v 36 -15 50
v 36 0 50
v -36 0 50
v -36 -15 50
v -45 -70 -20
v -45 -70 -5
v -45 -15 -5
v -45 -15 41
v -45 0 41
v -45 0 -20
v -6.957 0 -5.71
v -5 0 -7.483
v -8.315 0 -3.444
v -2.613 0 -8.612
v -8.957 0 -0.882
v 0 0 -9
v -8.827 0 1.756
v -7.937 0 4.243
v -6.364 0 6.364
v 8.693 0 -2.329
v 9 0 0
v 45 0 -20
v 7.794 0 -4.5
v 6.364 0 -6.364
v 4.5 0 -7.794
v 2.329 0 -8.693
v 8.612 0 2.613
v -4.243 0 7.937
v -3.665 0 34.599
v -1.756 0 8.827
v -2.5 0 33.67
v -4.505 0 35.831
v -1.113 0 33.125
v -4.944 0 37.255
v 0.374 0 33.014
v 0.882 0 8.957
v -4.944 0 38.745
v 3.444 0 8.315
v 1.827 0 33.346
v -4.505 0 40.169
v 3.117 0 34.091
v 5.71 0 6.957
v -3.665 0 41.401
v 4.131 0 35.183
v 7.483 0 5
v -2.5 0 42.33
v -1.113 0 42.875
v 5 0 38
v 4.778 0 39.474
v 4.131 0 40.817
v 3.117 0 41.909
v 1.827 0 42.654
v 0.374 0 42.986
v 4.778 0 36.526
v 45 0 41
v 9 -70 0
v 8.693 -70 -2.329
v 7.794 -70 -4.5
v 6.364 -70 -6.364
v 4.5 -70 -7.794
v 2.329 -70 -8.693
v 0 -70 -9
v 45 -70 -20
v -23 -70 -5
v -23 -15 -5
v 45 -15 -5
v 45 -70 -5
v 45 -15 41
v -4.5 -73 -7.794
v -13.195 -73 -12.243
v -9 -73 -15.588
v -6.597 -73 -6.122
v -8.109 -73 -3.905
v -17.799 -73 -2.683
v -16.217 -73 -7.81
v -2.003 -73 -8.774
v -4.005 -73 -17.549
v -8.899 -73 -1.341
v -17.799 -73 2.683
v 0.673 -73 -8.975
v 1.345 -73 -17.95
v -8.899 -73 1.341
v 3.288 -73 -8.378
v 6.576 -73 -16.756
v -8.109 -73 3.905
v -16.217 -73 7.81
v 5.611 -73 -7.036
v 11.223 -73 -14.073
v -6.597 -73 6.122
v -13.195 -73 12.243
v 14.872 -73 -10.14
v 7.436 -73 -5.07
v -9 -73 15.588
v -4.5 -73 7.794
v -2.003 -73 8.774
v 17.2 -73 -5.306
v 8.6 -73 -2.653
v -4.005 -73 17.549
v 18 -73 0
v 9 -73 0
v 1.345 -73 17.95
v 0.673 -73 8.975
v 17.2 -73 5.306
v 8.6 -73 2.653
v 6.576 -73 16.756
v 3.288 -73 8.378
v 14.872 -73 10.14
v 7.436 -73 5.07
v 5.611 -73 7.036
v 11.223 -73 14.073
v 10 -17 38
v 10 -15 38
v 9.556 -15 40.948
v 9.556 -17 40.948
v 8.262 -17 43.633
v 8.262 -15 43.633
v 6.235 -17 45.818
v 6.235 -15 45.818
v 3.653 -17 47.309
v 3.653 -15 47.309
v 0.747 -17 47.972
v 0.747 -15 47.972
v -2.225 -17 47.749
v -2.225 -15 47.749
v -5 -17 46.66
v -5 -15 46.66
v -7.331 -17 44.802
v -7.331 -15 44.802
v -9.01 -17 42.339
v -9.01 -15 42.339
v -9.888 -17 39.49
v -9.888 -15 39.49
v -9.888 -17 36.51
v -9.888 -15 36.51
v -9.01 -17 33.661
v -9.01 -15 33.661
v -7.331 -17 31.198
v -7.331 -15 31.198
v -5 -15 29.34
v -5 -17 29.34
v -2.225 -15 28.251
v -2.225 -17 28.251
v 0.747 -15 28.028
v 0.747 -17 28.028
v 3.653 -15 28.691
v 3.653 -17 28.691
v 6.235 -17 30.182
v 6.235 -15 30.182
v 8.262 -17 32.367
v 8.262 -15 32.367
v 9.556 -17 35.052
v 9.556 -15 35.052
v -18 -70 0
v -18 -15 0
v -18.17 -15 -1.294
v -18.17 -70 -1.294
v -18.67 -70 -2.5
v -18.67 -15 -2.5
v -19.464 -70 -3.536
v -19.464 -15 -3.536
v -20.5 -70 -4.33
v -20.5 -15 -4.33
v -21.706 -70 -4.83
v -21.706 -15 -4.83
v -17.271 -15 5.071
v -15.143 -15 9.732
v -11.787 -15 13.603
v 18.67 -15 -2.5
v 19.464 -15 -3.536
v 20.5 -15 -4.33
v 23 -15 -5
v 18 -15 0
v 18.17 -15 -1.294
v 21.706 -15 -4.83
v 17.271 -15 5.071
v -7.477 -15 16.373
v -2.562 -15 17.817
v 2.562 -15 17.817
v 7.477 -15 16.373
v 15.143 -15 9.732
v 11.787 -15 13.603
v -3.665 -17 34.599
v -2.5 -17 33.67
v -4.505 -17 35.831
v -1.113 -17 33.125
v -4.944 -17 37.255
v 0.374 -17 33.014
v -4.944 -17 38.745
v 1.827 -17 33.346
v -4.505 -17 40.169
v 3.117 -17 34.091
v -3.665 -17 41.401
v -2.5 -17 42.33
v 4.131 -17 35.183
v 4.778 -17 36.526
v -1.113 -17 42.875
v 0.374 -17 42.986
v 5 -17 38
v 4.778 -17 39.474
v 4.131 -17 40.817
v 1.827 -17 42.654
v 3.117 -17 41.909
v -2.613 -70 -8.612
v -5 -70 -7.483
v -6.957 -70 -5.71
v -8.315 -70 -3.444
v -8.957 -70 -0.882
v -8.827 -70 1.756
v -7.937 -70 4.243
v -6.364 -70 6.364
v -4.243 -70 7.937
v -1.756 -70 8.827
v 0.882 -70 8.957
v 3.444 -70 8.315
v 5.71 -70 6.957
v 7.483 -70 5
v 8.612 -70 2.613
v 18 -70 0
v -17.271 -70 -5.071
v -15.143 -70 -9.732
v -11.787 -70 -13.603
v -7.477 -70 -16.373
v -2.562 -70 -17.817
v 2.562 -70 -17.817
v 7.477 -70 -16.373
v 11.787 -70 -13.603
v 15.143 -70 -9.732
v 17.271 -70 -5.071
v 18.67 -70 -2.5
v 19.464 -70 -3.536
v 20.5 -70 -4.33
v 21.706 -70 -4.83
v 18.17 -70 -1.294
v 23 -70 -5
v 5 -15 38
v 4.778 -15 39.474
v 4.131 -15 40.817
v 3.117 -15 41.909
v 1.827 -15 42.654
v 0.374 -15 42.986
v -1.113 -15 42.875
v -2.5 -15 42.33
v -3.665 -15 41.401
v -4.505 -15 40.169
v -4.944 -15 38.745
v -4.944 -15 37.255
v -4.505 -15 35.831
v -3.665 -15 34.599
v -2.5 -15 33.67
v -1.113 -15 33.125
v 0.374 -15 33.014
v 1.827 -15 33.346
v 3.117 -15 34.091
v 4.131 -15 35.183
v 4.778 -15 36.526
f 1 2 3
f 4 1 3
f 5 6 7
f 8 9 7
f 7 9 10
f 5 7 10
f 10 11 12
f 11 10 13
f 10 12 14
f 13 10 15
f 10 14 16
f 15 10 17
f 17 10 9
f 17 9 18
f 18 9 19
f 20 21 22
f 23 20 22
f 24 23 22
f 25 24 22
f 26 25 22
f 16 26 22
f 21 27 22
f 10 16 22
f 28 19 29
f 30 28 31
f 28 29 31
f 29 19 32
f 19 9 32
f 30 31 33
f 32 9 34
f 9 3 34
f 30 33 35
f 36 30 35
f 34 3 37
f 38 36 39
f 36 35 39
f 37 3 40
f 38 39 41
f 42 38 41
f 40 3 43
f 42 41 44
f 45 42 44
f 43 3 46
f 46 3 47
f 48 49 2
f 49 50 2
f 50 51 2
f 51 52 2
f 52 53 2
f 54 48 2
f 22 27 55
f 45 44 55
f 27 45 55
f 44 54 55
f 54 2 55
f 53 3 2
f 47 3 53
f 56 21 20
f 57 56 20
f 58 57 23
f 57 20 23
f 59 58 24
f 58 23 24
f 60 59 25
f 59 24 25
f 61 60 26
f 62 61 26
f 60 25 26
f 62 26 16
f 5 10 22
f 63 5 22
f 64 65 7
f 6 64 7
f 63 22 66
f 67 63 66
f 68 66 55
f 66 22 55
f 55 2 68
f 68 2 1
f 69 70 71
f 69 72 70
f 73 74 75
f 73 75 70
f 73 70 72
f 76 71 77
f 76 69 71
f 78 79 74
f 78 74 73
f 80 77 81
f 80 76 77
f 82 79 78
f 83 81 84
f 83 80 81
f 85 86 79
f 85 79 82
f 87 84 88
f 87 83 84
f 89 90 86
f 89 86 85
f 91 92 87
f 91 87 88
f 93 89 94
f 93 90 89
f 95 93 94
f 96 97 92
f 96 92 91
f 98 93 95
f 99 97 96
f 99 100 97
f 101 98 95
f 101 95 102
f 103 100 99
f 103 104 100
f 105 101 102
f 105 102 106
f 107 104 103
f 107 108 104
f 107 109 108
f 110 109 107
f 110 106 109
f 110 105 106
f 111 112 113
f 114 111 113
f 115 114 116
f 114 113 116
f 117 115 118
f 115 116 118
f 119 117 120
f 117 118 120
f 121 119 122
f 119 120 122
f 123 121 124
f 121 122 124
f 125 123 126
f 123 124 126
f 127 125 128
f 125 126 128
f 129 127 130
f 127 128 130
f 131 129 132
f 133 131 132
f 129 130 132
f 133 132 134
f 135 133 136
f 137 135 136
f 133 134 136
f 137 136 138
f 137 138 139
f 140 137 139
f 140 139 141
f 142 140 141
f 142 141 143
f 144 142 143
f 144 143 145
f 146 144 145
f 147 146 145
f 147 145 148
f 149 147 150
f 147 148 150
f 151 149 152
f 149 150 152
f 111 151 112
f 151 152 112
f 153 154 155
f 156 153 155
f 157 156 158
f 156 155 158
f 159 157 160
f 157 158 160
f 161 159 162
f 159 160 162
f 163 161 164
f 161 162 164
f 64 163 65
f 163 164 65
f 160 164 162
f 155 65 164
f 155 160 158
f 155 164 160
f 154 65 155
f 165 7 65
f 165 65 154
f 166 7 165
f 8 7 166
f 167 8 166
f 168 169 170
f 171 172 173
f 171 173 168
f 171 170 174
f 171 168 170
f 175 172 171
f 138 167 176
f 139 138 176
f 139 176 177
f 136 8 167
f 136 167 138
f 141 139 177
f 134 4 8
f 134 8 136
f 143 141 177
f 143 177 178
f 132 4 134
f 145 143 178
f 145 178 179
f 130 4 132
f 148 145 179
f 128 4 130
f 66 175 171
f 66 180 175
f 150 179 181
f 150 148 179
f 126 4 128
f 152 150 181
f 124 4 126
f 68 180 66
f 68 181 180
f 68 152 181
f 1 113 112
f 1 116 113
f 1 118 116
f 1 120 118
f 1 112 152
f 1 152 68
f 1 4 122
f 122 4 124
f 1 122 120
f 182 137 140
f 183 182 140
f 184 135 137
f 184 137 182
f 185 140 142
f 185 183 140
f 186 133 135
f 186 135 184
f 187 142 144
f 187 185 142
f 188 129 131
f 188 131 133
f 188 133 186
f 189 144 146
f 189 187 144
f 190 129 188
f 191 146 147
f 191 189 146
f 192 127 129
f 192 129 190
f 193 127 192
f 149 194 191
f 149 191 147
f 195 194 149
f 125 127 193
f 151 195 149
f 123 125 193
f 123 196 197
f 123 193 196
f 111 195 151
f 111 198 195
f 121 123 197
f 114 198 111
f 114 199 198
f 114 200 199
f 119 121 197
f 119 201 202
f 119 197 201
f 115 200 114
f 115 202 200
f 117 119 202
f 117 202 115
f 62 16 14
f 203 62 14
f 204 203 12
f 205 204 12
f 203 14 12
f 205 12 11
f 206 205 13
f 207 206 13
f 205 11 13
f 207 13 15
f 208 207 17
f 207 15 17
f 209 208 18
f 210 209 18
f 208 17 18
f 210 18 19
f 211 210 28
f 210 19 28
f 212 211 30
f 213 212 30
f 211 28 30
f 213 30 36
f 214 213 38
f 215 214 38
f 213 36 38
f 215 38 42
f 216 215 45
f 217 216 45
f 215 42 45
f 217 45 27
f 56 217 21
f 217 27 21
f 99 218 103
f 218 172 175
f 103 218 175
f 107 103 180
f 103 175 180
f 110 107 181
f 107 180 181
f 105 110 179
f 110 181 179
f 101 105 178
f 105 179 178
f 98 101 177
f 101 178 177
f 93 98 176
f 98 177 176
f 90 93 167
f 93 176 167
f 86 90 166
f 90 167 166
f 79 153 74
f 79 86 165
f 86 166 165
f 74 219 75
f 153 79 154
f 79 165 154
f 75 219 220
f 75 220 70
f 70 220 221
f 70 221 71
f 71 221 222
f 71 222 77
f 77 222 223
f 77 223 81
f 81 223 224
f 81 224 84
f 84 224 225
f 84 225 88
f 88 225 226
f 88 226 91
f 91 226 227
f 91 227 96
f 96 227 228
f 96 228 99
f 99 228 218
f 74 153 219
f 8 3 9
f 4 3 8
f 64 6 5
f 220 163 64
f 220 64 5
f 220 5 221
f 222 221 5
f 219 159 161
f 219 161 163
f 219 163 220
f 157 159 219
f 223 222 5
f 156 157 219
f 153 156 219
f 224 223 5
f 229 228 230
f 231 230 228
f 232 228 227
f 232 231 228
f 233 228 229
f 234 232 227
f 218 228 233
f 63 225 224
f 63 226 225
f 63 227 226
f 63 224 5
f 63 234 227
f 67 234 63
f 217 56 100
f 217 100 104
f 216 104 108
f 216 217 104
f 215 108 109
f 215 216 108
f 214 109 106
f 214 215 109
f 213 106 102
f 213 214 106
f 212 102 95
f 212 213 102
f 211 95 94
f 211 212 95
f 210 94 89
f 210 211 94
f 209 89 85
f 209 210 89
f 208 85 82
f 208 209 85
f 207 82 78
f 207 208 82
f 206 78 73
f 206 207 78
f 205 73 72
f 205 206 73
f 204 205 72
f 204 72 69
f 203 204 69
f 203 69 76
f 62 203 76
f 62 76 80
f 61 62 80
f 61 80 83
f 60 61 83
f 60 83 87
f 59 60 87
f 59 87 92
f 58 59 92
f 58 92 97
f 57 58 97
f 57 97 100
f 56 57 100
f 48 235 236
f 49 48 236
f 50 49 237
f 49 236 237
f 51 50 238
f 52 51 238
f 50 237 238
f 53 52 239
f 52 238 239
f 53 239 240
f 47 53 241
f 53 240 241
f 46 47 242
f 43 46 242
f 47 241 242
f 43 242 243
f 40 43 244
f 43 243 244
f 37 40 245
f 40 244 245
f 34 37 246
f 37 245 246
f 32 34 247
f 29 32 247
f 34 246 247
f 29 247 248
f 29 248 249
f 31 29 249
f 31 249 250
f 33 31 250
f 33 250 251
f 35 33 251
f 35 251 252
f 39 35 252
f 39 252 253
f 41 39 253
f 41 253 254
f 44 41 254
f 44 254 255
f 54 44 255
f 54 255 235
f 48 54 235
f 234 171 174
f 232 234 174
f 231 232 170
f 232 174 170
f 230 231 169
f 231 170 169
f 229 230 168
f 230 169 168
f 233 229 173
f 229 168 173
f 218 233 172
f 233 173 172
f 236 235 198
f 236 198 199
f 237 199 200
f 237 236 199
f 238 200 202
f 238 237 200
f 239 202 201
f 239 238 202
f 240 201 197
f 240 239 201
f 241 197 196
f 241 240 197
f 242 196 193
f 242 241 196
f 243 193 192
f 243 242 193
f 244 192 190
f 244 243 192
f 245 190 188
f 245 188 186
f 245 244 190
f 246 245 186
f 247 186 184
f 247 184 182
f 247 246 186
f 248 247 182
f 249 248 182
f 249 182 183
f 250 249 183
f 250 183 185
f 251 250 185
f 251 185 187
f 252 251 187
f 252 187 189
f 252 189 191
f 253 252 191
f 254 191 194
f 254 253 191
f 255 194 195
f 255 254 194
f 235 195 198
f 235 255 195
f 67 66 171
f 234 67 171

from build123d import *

# Parameters (mm, degrees)
F1_DEPTH    = 70
F2_T1_DEPTH = 70
F3_T1_DEPTH = 70
F5_DEPTH    = 15
F6_SIZE     = 9
F7_R        = 9
F8_DEPTH    = 3
F9_R        = 5
F10_DEPTH   = 25
F11_R       = 10
F11_R_2     = 5
F12_DEPTH   = 2


# Not quite as in the source:
# - a fillet or chamfer that OpenCascade refuses, or shapes differently, is made with other operations: its cross-section is extruded or revolved along the edge and cut away or added


with BuildPart() as f1:
    # F0 (on Front) → F1 (new body)
    with BuildSketch(Plane.XZ):
        with BuildLine():
            Line((45, -5), (17.2916164658, -5))
            ThreePointArc((17.2916164658, -5), (10.8166538264, -14.3874945699), (0, -18))
            Line((0, -18), (0, -20))
            Line((0, -20), (45, -20))
            Line((45, -20), (45, -5))
        make_face()
        with BuildLine():
            ThreePointArc((17.2916164658, -5), (17.8220242451, -2.5249657043), (18, 0))
            ThreePointArc((18, 0), (-2.5249657043, 17.8220242451), (-17.2916164658, -5))
            ThreePointArc((-17.2916164658, -5), (-10.8166538264, -14.3874945699), (0, -18))
            ThreePointArc((0, -18), (10.8166538264, -14.3874945699), (17.2916164658, -5))
        make_face()
        with BuildLine():
            ThreePointArc((9, 0), (6.3639610307, -6.3639610307), (0, -9))
            ThreePointArc((0, -9), (-6.3639610307, 6.3639610307), (9, 0))
        make_face(mode=Mode.SUBTRACT)
        with BuildLine():
            ThreePointArc((0, -18), (-10.8166538264, -14.3874945699), (-17.2916164658, -5))
            Line((-17.2916164658, -5), (-45, -5))
            Line((-45, -5), (-45, -20))
            Line((-45, -20), (0, -20))
            Line((0, -20), (0, -18))
        make_face()
    extrude(amount=F1_DEPTH)

    # F2: fillet of radius 5 on 1 edges, made by hand

    # F2_s2 → F2_t1 (join)
    with BuildSketch(Plane.XZ):
        with BuildLine():
            ThreePointArc((-18, 0), (-19.4644660941, -3.5355339059), (-23, -5))
            Line((-23, -5), (-17.2916164658, -5))
            ThreePointArc((-17.2916164658, -5), (-17.8220242451, -2.5249657043), (-18, 0))
        make_face()
    extrude(amount=F2_T1_DEPTH)

    # F3: fillet of radius 5 on 1 edges, made by hand

    # F3_s2 → F3_t1 (join)
    with BuildSketch(Plane.XZ):
        with BuildLine():
            ThreePointArc((23, -5), (19.4644660941, -3.5355339059), (18, 0))
            ThreePointArc((18, 0), (17.8220242451, -2.5249657043), (17.2916164658, -5))
            Line((17.2916164658, -5), (23, -5))
        make_face()
    extrude(amount=F3_T1_DEPTH)

    # F4 (on Front) → F5 (join)
    with BuildSketch(Plane.XZ):
        with BuildLine():
            Line((23, -5), (45, -5))
            Line((45, -5), (45, 50))
            Line((45, 50), (-45, 50))
            Line((-45, 50), (-45, -5))
            Line((-45, -5), (-23, -5))
            ThreePointArc((-23, -5), (-19.4644660941, -3.5355339059), (-18, 0))
            ThreePointArc((-18, 0), (0, 18), (18, 0))
            ThreePointArc((18, 0), (19.4644660941, -3.5355339059), (23, -5))
        make_face()
    extrude(amount=F5_DEPTH)

    # F6
    f6_edges = [f1.edges().sort_by_distance(p)[0] for p in [
        (45, -7.5, 50),
        (-45, -7.5, 50),
    ]]
    chamfer(f6_edges, length=F6_SIZE)

    # F7 (on face) → F8 (join)
    with BuildSketch(Plane.XZ.offset(70)):
        with BuildLine():
            ThreePointArc((-18, 0), (0, -18), (18, 0))
            ThreePointArc((18, 0), (0, 18), (-18, 0))
        make_face()
        Circle(F7_R, mode=Mode.SUBTRACT)
    extrude(amount=F8_DEPTH)

    # F9 (on face) → F10 (cut)
    with BuildSketch(Plane.XZ.offset(15)):
        with Locations((0, 38)):
            Circle(F9_R)
    extrude(amount=-F10_DEPTH, mode=Mode.SUBTRACT)

    # F11 (on face) → F12 (join)
    with BuildSketch(Plane.XZ.offset(15)):
        with Locations((0, 38)):
            Circle(F11_R)
        with Locations((0, 38)):
            Circle(F11_R_2, mode=Mode.SUBTRACT)
    extrude(amount=F12_DEPTH)


solid = f1.part
